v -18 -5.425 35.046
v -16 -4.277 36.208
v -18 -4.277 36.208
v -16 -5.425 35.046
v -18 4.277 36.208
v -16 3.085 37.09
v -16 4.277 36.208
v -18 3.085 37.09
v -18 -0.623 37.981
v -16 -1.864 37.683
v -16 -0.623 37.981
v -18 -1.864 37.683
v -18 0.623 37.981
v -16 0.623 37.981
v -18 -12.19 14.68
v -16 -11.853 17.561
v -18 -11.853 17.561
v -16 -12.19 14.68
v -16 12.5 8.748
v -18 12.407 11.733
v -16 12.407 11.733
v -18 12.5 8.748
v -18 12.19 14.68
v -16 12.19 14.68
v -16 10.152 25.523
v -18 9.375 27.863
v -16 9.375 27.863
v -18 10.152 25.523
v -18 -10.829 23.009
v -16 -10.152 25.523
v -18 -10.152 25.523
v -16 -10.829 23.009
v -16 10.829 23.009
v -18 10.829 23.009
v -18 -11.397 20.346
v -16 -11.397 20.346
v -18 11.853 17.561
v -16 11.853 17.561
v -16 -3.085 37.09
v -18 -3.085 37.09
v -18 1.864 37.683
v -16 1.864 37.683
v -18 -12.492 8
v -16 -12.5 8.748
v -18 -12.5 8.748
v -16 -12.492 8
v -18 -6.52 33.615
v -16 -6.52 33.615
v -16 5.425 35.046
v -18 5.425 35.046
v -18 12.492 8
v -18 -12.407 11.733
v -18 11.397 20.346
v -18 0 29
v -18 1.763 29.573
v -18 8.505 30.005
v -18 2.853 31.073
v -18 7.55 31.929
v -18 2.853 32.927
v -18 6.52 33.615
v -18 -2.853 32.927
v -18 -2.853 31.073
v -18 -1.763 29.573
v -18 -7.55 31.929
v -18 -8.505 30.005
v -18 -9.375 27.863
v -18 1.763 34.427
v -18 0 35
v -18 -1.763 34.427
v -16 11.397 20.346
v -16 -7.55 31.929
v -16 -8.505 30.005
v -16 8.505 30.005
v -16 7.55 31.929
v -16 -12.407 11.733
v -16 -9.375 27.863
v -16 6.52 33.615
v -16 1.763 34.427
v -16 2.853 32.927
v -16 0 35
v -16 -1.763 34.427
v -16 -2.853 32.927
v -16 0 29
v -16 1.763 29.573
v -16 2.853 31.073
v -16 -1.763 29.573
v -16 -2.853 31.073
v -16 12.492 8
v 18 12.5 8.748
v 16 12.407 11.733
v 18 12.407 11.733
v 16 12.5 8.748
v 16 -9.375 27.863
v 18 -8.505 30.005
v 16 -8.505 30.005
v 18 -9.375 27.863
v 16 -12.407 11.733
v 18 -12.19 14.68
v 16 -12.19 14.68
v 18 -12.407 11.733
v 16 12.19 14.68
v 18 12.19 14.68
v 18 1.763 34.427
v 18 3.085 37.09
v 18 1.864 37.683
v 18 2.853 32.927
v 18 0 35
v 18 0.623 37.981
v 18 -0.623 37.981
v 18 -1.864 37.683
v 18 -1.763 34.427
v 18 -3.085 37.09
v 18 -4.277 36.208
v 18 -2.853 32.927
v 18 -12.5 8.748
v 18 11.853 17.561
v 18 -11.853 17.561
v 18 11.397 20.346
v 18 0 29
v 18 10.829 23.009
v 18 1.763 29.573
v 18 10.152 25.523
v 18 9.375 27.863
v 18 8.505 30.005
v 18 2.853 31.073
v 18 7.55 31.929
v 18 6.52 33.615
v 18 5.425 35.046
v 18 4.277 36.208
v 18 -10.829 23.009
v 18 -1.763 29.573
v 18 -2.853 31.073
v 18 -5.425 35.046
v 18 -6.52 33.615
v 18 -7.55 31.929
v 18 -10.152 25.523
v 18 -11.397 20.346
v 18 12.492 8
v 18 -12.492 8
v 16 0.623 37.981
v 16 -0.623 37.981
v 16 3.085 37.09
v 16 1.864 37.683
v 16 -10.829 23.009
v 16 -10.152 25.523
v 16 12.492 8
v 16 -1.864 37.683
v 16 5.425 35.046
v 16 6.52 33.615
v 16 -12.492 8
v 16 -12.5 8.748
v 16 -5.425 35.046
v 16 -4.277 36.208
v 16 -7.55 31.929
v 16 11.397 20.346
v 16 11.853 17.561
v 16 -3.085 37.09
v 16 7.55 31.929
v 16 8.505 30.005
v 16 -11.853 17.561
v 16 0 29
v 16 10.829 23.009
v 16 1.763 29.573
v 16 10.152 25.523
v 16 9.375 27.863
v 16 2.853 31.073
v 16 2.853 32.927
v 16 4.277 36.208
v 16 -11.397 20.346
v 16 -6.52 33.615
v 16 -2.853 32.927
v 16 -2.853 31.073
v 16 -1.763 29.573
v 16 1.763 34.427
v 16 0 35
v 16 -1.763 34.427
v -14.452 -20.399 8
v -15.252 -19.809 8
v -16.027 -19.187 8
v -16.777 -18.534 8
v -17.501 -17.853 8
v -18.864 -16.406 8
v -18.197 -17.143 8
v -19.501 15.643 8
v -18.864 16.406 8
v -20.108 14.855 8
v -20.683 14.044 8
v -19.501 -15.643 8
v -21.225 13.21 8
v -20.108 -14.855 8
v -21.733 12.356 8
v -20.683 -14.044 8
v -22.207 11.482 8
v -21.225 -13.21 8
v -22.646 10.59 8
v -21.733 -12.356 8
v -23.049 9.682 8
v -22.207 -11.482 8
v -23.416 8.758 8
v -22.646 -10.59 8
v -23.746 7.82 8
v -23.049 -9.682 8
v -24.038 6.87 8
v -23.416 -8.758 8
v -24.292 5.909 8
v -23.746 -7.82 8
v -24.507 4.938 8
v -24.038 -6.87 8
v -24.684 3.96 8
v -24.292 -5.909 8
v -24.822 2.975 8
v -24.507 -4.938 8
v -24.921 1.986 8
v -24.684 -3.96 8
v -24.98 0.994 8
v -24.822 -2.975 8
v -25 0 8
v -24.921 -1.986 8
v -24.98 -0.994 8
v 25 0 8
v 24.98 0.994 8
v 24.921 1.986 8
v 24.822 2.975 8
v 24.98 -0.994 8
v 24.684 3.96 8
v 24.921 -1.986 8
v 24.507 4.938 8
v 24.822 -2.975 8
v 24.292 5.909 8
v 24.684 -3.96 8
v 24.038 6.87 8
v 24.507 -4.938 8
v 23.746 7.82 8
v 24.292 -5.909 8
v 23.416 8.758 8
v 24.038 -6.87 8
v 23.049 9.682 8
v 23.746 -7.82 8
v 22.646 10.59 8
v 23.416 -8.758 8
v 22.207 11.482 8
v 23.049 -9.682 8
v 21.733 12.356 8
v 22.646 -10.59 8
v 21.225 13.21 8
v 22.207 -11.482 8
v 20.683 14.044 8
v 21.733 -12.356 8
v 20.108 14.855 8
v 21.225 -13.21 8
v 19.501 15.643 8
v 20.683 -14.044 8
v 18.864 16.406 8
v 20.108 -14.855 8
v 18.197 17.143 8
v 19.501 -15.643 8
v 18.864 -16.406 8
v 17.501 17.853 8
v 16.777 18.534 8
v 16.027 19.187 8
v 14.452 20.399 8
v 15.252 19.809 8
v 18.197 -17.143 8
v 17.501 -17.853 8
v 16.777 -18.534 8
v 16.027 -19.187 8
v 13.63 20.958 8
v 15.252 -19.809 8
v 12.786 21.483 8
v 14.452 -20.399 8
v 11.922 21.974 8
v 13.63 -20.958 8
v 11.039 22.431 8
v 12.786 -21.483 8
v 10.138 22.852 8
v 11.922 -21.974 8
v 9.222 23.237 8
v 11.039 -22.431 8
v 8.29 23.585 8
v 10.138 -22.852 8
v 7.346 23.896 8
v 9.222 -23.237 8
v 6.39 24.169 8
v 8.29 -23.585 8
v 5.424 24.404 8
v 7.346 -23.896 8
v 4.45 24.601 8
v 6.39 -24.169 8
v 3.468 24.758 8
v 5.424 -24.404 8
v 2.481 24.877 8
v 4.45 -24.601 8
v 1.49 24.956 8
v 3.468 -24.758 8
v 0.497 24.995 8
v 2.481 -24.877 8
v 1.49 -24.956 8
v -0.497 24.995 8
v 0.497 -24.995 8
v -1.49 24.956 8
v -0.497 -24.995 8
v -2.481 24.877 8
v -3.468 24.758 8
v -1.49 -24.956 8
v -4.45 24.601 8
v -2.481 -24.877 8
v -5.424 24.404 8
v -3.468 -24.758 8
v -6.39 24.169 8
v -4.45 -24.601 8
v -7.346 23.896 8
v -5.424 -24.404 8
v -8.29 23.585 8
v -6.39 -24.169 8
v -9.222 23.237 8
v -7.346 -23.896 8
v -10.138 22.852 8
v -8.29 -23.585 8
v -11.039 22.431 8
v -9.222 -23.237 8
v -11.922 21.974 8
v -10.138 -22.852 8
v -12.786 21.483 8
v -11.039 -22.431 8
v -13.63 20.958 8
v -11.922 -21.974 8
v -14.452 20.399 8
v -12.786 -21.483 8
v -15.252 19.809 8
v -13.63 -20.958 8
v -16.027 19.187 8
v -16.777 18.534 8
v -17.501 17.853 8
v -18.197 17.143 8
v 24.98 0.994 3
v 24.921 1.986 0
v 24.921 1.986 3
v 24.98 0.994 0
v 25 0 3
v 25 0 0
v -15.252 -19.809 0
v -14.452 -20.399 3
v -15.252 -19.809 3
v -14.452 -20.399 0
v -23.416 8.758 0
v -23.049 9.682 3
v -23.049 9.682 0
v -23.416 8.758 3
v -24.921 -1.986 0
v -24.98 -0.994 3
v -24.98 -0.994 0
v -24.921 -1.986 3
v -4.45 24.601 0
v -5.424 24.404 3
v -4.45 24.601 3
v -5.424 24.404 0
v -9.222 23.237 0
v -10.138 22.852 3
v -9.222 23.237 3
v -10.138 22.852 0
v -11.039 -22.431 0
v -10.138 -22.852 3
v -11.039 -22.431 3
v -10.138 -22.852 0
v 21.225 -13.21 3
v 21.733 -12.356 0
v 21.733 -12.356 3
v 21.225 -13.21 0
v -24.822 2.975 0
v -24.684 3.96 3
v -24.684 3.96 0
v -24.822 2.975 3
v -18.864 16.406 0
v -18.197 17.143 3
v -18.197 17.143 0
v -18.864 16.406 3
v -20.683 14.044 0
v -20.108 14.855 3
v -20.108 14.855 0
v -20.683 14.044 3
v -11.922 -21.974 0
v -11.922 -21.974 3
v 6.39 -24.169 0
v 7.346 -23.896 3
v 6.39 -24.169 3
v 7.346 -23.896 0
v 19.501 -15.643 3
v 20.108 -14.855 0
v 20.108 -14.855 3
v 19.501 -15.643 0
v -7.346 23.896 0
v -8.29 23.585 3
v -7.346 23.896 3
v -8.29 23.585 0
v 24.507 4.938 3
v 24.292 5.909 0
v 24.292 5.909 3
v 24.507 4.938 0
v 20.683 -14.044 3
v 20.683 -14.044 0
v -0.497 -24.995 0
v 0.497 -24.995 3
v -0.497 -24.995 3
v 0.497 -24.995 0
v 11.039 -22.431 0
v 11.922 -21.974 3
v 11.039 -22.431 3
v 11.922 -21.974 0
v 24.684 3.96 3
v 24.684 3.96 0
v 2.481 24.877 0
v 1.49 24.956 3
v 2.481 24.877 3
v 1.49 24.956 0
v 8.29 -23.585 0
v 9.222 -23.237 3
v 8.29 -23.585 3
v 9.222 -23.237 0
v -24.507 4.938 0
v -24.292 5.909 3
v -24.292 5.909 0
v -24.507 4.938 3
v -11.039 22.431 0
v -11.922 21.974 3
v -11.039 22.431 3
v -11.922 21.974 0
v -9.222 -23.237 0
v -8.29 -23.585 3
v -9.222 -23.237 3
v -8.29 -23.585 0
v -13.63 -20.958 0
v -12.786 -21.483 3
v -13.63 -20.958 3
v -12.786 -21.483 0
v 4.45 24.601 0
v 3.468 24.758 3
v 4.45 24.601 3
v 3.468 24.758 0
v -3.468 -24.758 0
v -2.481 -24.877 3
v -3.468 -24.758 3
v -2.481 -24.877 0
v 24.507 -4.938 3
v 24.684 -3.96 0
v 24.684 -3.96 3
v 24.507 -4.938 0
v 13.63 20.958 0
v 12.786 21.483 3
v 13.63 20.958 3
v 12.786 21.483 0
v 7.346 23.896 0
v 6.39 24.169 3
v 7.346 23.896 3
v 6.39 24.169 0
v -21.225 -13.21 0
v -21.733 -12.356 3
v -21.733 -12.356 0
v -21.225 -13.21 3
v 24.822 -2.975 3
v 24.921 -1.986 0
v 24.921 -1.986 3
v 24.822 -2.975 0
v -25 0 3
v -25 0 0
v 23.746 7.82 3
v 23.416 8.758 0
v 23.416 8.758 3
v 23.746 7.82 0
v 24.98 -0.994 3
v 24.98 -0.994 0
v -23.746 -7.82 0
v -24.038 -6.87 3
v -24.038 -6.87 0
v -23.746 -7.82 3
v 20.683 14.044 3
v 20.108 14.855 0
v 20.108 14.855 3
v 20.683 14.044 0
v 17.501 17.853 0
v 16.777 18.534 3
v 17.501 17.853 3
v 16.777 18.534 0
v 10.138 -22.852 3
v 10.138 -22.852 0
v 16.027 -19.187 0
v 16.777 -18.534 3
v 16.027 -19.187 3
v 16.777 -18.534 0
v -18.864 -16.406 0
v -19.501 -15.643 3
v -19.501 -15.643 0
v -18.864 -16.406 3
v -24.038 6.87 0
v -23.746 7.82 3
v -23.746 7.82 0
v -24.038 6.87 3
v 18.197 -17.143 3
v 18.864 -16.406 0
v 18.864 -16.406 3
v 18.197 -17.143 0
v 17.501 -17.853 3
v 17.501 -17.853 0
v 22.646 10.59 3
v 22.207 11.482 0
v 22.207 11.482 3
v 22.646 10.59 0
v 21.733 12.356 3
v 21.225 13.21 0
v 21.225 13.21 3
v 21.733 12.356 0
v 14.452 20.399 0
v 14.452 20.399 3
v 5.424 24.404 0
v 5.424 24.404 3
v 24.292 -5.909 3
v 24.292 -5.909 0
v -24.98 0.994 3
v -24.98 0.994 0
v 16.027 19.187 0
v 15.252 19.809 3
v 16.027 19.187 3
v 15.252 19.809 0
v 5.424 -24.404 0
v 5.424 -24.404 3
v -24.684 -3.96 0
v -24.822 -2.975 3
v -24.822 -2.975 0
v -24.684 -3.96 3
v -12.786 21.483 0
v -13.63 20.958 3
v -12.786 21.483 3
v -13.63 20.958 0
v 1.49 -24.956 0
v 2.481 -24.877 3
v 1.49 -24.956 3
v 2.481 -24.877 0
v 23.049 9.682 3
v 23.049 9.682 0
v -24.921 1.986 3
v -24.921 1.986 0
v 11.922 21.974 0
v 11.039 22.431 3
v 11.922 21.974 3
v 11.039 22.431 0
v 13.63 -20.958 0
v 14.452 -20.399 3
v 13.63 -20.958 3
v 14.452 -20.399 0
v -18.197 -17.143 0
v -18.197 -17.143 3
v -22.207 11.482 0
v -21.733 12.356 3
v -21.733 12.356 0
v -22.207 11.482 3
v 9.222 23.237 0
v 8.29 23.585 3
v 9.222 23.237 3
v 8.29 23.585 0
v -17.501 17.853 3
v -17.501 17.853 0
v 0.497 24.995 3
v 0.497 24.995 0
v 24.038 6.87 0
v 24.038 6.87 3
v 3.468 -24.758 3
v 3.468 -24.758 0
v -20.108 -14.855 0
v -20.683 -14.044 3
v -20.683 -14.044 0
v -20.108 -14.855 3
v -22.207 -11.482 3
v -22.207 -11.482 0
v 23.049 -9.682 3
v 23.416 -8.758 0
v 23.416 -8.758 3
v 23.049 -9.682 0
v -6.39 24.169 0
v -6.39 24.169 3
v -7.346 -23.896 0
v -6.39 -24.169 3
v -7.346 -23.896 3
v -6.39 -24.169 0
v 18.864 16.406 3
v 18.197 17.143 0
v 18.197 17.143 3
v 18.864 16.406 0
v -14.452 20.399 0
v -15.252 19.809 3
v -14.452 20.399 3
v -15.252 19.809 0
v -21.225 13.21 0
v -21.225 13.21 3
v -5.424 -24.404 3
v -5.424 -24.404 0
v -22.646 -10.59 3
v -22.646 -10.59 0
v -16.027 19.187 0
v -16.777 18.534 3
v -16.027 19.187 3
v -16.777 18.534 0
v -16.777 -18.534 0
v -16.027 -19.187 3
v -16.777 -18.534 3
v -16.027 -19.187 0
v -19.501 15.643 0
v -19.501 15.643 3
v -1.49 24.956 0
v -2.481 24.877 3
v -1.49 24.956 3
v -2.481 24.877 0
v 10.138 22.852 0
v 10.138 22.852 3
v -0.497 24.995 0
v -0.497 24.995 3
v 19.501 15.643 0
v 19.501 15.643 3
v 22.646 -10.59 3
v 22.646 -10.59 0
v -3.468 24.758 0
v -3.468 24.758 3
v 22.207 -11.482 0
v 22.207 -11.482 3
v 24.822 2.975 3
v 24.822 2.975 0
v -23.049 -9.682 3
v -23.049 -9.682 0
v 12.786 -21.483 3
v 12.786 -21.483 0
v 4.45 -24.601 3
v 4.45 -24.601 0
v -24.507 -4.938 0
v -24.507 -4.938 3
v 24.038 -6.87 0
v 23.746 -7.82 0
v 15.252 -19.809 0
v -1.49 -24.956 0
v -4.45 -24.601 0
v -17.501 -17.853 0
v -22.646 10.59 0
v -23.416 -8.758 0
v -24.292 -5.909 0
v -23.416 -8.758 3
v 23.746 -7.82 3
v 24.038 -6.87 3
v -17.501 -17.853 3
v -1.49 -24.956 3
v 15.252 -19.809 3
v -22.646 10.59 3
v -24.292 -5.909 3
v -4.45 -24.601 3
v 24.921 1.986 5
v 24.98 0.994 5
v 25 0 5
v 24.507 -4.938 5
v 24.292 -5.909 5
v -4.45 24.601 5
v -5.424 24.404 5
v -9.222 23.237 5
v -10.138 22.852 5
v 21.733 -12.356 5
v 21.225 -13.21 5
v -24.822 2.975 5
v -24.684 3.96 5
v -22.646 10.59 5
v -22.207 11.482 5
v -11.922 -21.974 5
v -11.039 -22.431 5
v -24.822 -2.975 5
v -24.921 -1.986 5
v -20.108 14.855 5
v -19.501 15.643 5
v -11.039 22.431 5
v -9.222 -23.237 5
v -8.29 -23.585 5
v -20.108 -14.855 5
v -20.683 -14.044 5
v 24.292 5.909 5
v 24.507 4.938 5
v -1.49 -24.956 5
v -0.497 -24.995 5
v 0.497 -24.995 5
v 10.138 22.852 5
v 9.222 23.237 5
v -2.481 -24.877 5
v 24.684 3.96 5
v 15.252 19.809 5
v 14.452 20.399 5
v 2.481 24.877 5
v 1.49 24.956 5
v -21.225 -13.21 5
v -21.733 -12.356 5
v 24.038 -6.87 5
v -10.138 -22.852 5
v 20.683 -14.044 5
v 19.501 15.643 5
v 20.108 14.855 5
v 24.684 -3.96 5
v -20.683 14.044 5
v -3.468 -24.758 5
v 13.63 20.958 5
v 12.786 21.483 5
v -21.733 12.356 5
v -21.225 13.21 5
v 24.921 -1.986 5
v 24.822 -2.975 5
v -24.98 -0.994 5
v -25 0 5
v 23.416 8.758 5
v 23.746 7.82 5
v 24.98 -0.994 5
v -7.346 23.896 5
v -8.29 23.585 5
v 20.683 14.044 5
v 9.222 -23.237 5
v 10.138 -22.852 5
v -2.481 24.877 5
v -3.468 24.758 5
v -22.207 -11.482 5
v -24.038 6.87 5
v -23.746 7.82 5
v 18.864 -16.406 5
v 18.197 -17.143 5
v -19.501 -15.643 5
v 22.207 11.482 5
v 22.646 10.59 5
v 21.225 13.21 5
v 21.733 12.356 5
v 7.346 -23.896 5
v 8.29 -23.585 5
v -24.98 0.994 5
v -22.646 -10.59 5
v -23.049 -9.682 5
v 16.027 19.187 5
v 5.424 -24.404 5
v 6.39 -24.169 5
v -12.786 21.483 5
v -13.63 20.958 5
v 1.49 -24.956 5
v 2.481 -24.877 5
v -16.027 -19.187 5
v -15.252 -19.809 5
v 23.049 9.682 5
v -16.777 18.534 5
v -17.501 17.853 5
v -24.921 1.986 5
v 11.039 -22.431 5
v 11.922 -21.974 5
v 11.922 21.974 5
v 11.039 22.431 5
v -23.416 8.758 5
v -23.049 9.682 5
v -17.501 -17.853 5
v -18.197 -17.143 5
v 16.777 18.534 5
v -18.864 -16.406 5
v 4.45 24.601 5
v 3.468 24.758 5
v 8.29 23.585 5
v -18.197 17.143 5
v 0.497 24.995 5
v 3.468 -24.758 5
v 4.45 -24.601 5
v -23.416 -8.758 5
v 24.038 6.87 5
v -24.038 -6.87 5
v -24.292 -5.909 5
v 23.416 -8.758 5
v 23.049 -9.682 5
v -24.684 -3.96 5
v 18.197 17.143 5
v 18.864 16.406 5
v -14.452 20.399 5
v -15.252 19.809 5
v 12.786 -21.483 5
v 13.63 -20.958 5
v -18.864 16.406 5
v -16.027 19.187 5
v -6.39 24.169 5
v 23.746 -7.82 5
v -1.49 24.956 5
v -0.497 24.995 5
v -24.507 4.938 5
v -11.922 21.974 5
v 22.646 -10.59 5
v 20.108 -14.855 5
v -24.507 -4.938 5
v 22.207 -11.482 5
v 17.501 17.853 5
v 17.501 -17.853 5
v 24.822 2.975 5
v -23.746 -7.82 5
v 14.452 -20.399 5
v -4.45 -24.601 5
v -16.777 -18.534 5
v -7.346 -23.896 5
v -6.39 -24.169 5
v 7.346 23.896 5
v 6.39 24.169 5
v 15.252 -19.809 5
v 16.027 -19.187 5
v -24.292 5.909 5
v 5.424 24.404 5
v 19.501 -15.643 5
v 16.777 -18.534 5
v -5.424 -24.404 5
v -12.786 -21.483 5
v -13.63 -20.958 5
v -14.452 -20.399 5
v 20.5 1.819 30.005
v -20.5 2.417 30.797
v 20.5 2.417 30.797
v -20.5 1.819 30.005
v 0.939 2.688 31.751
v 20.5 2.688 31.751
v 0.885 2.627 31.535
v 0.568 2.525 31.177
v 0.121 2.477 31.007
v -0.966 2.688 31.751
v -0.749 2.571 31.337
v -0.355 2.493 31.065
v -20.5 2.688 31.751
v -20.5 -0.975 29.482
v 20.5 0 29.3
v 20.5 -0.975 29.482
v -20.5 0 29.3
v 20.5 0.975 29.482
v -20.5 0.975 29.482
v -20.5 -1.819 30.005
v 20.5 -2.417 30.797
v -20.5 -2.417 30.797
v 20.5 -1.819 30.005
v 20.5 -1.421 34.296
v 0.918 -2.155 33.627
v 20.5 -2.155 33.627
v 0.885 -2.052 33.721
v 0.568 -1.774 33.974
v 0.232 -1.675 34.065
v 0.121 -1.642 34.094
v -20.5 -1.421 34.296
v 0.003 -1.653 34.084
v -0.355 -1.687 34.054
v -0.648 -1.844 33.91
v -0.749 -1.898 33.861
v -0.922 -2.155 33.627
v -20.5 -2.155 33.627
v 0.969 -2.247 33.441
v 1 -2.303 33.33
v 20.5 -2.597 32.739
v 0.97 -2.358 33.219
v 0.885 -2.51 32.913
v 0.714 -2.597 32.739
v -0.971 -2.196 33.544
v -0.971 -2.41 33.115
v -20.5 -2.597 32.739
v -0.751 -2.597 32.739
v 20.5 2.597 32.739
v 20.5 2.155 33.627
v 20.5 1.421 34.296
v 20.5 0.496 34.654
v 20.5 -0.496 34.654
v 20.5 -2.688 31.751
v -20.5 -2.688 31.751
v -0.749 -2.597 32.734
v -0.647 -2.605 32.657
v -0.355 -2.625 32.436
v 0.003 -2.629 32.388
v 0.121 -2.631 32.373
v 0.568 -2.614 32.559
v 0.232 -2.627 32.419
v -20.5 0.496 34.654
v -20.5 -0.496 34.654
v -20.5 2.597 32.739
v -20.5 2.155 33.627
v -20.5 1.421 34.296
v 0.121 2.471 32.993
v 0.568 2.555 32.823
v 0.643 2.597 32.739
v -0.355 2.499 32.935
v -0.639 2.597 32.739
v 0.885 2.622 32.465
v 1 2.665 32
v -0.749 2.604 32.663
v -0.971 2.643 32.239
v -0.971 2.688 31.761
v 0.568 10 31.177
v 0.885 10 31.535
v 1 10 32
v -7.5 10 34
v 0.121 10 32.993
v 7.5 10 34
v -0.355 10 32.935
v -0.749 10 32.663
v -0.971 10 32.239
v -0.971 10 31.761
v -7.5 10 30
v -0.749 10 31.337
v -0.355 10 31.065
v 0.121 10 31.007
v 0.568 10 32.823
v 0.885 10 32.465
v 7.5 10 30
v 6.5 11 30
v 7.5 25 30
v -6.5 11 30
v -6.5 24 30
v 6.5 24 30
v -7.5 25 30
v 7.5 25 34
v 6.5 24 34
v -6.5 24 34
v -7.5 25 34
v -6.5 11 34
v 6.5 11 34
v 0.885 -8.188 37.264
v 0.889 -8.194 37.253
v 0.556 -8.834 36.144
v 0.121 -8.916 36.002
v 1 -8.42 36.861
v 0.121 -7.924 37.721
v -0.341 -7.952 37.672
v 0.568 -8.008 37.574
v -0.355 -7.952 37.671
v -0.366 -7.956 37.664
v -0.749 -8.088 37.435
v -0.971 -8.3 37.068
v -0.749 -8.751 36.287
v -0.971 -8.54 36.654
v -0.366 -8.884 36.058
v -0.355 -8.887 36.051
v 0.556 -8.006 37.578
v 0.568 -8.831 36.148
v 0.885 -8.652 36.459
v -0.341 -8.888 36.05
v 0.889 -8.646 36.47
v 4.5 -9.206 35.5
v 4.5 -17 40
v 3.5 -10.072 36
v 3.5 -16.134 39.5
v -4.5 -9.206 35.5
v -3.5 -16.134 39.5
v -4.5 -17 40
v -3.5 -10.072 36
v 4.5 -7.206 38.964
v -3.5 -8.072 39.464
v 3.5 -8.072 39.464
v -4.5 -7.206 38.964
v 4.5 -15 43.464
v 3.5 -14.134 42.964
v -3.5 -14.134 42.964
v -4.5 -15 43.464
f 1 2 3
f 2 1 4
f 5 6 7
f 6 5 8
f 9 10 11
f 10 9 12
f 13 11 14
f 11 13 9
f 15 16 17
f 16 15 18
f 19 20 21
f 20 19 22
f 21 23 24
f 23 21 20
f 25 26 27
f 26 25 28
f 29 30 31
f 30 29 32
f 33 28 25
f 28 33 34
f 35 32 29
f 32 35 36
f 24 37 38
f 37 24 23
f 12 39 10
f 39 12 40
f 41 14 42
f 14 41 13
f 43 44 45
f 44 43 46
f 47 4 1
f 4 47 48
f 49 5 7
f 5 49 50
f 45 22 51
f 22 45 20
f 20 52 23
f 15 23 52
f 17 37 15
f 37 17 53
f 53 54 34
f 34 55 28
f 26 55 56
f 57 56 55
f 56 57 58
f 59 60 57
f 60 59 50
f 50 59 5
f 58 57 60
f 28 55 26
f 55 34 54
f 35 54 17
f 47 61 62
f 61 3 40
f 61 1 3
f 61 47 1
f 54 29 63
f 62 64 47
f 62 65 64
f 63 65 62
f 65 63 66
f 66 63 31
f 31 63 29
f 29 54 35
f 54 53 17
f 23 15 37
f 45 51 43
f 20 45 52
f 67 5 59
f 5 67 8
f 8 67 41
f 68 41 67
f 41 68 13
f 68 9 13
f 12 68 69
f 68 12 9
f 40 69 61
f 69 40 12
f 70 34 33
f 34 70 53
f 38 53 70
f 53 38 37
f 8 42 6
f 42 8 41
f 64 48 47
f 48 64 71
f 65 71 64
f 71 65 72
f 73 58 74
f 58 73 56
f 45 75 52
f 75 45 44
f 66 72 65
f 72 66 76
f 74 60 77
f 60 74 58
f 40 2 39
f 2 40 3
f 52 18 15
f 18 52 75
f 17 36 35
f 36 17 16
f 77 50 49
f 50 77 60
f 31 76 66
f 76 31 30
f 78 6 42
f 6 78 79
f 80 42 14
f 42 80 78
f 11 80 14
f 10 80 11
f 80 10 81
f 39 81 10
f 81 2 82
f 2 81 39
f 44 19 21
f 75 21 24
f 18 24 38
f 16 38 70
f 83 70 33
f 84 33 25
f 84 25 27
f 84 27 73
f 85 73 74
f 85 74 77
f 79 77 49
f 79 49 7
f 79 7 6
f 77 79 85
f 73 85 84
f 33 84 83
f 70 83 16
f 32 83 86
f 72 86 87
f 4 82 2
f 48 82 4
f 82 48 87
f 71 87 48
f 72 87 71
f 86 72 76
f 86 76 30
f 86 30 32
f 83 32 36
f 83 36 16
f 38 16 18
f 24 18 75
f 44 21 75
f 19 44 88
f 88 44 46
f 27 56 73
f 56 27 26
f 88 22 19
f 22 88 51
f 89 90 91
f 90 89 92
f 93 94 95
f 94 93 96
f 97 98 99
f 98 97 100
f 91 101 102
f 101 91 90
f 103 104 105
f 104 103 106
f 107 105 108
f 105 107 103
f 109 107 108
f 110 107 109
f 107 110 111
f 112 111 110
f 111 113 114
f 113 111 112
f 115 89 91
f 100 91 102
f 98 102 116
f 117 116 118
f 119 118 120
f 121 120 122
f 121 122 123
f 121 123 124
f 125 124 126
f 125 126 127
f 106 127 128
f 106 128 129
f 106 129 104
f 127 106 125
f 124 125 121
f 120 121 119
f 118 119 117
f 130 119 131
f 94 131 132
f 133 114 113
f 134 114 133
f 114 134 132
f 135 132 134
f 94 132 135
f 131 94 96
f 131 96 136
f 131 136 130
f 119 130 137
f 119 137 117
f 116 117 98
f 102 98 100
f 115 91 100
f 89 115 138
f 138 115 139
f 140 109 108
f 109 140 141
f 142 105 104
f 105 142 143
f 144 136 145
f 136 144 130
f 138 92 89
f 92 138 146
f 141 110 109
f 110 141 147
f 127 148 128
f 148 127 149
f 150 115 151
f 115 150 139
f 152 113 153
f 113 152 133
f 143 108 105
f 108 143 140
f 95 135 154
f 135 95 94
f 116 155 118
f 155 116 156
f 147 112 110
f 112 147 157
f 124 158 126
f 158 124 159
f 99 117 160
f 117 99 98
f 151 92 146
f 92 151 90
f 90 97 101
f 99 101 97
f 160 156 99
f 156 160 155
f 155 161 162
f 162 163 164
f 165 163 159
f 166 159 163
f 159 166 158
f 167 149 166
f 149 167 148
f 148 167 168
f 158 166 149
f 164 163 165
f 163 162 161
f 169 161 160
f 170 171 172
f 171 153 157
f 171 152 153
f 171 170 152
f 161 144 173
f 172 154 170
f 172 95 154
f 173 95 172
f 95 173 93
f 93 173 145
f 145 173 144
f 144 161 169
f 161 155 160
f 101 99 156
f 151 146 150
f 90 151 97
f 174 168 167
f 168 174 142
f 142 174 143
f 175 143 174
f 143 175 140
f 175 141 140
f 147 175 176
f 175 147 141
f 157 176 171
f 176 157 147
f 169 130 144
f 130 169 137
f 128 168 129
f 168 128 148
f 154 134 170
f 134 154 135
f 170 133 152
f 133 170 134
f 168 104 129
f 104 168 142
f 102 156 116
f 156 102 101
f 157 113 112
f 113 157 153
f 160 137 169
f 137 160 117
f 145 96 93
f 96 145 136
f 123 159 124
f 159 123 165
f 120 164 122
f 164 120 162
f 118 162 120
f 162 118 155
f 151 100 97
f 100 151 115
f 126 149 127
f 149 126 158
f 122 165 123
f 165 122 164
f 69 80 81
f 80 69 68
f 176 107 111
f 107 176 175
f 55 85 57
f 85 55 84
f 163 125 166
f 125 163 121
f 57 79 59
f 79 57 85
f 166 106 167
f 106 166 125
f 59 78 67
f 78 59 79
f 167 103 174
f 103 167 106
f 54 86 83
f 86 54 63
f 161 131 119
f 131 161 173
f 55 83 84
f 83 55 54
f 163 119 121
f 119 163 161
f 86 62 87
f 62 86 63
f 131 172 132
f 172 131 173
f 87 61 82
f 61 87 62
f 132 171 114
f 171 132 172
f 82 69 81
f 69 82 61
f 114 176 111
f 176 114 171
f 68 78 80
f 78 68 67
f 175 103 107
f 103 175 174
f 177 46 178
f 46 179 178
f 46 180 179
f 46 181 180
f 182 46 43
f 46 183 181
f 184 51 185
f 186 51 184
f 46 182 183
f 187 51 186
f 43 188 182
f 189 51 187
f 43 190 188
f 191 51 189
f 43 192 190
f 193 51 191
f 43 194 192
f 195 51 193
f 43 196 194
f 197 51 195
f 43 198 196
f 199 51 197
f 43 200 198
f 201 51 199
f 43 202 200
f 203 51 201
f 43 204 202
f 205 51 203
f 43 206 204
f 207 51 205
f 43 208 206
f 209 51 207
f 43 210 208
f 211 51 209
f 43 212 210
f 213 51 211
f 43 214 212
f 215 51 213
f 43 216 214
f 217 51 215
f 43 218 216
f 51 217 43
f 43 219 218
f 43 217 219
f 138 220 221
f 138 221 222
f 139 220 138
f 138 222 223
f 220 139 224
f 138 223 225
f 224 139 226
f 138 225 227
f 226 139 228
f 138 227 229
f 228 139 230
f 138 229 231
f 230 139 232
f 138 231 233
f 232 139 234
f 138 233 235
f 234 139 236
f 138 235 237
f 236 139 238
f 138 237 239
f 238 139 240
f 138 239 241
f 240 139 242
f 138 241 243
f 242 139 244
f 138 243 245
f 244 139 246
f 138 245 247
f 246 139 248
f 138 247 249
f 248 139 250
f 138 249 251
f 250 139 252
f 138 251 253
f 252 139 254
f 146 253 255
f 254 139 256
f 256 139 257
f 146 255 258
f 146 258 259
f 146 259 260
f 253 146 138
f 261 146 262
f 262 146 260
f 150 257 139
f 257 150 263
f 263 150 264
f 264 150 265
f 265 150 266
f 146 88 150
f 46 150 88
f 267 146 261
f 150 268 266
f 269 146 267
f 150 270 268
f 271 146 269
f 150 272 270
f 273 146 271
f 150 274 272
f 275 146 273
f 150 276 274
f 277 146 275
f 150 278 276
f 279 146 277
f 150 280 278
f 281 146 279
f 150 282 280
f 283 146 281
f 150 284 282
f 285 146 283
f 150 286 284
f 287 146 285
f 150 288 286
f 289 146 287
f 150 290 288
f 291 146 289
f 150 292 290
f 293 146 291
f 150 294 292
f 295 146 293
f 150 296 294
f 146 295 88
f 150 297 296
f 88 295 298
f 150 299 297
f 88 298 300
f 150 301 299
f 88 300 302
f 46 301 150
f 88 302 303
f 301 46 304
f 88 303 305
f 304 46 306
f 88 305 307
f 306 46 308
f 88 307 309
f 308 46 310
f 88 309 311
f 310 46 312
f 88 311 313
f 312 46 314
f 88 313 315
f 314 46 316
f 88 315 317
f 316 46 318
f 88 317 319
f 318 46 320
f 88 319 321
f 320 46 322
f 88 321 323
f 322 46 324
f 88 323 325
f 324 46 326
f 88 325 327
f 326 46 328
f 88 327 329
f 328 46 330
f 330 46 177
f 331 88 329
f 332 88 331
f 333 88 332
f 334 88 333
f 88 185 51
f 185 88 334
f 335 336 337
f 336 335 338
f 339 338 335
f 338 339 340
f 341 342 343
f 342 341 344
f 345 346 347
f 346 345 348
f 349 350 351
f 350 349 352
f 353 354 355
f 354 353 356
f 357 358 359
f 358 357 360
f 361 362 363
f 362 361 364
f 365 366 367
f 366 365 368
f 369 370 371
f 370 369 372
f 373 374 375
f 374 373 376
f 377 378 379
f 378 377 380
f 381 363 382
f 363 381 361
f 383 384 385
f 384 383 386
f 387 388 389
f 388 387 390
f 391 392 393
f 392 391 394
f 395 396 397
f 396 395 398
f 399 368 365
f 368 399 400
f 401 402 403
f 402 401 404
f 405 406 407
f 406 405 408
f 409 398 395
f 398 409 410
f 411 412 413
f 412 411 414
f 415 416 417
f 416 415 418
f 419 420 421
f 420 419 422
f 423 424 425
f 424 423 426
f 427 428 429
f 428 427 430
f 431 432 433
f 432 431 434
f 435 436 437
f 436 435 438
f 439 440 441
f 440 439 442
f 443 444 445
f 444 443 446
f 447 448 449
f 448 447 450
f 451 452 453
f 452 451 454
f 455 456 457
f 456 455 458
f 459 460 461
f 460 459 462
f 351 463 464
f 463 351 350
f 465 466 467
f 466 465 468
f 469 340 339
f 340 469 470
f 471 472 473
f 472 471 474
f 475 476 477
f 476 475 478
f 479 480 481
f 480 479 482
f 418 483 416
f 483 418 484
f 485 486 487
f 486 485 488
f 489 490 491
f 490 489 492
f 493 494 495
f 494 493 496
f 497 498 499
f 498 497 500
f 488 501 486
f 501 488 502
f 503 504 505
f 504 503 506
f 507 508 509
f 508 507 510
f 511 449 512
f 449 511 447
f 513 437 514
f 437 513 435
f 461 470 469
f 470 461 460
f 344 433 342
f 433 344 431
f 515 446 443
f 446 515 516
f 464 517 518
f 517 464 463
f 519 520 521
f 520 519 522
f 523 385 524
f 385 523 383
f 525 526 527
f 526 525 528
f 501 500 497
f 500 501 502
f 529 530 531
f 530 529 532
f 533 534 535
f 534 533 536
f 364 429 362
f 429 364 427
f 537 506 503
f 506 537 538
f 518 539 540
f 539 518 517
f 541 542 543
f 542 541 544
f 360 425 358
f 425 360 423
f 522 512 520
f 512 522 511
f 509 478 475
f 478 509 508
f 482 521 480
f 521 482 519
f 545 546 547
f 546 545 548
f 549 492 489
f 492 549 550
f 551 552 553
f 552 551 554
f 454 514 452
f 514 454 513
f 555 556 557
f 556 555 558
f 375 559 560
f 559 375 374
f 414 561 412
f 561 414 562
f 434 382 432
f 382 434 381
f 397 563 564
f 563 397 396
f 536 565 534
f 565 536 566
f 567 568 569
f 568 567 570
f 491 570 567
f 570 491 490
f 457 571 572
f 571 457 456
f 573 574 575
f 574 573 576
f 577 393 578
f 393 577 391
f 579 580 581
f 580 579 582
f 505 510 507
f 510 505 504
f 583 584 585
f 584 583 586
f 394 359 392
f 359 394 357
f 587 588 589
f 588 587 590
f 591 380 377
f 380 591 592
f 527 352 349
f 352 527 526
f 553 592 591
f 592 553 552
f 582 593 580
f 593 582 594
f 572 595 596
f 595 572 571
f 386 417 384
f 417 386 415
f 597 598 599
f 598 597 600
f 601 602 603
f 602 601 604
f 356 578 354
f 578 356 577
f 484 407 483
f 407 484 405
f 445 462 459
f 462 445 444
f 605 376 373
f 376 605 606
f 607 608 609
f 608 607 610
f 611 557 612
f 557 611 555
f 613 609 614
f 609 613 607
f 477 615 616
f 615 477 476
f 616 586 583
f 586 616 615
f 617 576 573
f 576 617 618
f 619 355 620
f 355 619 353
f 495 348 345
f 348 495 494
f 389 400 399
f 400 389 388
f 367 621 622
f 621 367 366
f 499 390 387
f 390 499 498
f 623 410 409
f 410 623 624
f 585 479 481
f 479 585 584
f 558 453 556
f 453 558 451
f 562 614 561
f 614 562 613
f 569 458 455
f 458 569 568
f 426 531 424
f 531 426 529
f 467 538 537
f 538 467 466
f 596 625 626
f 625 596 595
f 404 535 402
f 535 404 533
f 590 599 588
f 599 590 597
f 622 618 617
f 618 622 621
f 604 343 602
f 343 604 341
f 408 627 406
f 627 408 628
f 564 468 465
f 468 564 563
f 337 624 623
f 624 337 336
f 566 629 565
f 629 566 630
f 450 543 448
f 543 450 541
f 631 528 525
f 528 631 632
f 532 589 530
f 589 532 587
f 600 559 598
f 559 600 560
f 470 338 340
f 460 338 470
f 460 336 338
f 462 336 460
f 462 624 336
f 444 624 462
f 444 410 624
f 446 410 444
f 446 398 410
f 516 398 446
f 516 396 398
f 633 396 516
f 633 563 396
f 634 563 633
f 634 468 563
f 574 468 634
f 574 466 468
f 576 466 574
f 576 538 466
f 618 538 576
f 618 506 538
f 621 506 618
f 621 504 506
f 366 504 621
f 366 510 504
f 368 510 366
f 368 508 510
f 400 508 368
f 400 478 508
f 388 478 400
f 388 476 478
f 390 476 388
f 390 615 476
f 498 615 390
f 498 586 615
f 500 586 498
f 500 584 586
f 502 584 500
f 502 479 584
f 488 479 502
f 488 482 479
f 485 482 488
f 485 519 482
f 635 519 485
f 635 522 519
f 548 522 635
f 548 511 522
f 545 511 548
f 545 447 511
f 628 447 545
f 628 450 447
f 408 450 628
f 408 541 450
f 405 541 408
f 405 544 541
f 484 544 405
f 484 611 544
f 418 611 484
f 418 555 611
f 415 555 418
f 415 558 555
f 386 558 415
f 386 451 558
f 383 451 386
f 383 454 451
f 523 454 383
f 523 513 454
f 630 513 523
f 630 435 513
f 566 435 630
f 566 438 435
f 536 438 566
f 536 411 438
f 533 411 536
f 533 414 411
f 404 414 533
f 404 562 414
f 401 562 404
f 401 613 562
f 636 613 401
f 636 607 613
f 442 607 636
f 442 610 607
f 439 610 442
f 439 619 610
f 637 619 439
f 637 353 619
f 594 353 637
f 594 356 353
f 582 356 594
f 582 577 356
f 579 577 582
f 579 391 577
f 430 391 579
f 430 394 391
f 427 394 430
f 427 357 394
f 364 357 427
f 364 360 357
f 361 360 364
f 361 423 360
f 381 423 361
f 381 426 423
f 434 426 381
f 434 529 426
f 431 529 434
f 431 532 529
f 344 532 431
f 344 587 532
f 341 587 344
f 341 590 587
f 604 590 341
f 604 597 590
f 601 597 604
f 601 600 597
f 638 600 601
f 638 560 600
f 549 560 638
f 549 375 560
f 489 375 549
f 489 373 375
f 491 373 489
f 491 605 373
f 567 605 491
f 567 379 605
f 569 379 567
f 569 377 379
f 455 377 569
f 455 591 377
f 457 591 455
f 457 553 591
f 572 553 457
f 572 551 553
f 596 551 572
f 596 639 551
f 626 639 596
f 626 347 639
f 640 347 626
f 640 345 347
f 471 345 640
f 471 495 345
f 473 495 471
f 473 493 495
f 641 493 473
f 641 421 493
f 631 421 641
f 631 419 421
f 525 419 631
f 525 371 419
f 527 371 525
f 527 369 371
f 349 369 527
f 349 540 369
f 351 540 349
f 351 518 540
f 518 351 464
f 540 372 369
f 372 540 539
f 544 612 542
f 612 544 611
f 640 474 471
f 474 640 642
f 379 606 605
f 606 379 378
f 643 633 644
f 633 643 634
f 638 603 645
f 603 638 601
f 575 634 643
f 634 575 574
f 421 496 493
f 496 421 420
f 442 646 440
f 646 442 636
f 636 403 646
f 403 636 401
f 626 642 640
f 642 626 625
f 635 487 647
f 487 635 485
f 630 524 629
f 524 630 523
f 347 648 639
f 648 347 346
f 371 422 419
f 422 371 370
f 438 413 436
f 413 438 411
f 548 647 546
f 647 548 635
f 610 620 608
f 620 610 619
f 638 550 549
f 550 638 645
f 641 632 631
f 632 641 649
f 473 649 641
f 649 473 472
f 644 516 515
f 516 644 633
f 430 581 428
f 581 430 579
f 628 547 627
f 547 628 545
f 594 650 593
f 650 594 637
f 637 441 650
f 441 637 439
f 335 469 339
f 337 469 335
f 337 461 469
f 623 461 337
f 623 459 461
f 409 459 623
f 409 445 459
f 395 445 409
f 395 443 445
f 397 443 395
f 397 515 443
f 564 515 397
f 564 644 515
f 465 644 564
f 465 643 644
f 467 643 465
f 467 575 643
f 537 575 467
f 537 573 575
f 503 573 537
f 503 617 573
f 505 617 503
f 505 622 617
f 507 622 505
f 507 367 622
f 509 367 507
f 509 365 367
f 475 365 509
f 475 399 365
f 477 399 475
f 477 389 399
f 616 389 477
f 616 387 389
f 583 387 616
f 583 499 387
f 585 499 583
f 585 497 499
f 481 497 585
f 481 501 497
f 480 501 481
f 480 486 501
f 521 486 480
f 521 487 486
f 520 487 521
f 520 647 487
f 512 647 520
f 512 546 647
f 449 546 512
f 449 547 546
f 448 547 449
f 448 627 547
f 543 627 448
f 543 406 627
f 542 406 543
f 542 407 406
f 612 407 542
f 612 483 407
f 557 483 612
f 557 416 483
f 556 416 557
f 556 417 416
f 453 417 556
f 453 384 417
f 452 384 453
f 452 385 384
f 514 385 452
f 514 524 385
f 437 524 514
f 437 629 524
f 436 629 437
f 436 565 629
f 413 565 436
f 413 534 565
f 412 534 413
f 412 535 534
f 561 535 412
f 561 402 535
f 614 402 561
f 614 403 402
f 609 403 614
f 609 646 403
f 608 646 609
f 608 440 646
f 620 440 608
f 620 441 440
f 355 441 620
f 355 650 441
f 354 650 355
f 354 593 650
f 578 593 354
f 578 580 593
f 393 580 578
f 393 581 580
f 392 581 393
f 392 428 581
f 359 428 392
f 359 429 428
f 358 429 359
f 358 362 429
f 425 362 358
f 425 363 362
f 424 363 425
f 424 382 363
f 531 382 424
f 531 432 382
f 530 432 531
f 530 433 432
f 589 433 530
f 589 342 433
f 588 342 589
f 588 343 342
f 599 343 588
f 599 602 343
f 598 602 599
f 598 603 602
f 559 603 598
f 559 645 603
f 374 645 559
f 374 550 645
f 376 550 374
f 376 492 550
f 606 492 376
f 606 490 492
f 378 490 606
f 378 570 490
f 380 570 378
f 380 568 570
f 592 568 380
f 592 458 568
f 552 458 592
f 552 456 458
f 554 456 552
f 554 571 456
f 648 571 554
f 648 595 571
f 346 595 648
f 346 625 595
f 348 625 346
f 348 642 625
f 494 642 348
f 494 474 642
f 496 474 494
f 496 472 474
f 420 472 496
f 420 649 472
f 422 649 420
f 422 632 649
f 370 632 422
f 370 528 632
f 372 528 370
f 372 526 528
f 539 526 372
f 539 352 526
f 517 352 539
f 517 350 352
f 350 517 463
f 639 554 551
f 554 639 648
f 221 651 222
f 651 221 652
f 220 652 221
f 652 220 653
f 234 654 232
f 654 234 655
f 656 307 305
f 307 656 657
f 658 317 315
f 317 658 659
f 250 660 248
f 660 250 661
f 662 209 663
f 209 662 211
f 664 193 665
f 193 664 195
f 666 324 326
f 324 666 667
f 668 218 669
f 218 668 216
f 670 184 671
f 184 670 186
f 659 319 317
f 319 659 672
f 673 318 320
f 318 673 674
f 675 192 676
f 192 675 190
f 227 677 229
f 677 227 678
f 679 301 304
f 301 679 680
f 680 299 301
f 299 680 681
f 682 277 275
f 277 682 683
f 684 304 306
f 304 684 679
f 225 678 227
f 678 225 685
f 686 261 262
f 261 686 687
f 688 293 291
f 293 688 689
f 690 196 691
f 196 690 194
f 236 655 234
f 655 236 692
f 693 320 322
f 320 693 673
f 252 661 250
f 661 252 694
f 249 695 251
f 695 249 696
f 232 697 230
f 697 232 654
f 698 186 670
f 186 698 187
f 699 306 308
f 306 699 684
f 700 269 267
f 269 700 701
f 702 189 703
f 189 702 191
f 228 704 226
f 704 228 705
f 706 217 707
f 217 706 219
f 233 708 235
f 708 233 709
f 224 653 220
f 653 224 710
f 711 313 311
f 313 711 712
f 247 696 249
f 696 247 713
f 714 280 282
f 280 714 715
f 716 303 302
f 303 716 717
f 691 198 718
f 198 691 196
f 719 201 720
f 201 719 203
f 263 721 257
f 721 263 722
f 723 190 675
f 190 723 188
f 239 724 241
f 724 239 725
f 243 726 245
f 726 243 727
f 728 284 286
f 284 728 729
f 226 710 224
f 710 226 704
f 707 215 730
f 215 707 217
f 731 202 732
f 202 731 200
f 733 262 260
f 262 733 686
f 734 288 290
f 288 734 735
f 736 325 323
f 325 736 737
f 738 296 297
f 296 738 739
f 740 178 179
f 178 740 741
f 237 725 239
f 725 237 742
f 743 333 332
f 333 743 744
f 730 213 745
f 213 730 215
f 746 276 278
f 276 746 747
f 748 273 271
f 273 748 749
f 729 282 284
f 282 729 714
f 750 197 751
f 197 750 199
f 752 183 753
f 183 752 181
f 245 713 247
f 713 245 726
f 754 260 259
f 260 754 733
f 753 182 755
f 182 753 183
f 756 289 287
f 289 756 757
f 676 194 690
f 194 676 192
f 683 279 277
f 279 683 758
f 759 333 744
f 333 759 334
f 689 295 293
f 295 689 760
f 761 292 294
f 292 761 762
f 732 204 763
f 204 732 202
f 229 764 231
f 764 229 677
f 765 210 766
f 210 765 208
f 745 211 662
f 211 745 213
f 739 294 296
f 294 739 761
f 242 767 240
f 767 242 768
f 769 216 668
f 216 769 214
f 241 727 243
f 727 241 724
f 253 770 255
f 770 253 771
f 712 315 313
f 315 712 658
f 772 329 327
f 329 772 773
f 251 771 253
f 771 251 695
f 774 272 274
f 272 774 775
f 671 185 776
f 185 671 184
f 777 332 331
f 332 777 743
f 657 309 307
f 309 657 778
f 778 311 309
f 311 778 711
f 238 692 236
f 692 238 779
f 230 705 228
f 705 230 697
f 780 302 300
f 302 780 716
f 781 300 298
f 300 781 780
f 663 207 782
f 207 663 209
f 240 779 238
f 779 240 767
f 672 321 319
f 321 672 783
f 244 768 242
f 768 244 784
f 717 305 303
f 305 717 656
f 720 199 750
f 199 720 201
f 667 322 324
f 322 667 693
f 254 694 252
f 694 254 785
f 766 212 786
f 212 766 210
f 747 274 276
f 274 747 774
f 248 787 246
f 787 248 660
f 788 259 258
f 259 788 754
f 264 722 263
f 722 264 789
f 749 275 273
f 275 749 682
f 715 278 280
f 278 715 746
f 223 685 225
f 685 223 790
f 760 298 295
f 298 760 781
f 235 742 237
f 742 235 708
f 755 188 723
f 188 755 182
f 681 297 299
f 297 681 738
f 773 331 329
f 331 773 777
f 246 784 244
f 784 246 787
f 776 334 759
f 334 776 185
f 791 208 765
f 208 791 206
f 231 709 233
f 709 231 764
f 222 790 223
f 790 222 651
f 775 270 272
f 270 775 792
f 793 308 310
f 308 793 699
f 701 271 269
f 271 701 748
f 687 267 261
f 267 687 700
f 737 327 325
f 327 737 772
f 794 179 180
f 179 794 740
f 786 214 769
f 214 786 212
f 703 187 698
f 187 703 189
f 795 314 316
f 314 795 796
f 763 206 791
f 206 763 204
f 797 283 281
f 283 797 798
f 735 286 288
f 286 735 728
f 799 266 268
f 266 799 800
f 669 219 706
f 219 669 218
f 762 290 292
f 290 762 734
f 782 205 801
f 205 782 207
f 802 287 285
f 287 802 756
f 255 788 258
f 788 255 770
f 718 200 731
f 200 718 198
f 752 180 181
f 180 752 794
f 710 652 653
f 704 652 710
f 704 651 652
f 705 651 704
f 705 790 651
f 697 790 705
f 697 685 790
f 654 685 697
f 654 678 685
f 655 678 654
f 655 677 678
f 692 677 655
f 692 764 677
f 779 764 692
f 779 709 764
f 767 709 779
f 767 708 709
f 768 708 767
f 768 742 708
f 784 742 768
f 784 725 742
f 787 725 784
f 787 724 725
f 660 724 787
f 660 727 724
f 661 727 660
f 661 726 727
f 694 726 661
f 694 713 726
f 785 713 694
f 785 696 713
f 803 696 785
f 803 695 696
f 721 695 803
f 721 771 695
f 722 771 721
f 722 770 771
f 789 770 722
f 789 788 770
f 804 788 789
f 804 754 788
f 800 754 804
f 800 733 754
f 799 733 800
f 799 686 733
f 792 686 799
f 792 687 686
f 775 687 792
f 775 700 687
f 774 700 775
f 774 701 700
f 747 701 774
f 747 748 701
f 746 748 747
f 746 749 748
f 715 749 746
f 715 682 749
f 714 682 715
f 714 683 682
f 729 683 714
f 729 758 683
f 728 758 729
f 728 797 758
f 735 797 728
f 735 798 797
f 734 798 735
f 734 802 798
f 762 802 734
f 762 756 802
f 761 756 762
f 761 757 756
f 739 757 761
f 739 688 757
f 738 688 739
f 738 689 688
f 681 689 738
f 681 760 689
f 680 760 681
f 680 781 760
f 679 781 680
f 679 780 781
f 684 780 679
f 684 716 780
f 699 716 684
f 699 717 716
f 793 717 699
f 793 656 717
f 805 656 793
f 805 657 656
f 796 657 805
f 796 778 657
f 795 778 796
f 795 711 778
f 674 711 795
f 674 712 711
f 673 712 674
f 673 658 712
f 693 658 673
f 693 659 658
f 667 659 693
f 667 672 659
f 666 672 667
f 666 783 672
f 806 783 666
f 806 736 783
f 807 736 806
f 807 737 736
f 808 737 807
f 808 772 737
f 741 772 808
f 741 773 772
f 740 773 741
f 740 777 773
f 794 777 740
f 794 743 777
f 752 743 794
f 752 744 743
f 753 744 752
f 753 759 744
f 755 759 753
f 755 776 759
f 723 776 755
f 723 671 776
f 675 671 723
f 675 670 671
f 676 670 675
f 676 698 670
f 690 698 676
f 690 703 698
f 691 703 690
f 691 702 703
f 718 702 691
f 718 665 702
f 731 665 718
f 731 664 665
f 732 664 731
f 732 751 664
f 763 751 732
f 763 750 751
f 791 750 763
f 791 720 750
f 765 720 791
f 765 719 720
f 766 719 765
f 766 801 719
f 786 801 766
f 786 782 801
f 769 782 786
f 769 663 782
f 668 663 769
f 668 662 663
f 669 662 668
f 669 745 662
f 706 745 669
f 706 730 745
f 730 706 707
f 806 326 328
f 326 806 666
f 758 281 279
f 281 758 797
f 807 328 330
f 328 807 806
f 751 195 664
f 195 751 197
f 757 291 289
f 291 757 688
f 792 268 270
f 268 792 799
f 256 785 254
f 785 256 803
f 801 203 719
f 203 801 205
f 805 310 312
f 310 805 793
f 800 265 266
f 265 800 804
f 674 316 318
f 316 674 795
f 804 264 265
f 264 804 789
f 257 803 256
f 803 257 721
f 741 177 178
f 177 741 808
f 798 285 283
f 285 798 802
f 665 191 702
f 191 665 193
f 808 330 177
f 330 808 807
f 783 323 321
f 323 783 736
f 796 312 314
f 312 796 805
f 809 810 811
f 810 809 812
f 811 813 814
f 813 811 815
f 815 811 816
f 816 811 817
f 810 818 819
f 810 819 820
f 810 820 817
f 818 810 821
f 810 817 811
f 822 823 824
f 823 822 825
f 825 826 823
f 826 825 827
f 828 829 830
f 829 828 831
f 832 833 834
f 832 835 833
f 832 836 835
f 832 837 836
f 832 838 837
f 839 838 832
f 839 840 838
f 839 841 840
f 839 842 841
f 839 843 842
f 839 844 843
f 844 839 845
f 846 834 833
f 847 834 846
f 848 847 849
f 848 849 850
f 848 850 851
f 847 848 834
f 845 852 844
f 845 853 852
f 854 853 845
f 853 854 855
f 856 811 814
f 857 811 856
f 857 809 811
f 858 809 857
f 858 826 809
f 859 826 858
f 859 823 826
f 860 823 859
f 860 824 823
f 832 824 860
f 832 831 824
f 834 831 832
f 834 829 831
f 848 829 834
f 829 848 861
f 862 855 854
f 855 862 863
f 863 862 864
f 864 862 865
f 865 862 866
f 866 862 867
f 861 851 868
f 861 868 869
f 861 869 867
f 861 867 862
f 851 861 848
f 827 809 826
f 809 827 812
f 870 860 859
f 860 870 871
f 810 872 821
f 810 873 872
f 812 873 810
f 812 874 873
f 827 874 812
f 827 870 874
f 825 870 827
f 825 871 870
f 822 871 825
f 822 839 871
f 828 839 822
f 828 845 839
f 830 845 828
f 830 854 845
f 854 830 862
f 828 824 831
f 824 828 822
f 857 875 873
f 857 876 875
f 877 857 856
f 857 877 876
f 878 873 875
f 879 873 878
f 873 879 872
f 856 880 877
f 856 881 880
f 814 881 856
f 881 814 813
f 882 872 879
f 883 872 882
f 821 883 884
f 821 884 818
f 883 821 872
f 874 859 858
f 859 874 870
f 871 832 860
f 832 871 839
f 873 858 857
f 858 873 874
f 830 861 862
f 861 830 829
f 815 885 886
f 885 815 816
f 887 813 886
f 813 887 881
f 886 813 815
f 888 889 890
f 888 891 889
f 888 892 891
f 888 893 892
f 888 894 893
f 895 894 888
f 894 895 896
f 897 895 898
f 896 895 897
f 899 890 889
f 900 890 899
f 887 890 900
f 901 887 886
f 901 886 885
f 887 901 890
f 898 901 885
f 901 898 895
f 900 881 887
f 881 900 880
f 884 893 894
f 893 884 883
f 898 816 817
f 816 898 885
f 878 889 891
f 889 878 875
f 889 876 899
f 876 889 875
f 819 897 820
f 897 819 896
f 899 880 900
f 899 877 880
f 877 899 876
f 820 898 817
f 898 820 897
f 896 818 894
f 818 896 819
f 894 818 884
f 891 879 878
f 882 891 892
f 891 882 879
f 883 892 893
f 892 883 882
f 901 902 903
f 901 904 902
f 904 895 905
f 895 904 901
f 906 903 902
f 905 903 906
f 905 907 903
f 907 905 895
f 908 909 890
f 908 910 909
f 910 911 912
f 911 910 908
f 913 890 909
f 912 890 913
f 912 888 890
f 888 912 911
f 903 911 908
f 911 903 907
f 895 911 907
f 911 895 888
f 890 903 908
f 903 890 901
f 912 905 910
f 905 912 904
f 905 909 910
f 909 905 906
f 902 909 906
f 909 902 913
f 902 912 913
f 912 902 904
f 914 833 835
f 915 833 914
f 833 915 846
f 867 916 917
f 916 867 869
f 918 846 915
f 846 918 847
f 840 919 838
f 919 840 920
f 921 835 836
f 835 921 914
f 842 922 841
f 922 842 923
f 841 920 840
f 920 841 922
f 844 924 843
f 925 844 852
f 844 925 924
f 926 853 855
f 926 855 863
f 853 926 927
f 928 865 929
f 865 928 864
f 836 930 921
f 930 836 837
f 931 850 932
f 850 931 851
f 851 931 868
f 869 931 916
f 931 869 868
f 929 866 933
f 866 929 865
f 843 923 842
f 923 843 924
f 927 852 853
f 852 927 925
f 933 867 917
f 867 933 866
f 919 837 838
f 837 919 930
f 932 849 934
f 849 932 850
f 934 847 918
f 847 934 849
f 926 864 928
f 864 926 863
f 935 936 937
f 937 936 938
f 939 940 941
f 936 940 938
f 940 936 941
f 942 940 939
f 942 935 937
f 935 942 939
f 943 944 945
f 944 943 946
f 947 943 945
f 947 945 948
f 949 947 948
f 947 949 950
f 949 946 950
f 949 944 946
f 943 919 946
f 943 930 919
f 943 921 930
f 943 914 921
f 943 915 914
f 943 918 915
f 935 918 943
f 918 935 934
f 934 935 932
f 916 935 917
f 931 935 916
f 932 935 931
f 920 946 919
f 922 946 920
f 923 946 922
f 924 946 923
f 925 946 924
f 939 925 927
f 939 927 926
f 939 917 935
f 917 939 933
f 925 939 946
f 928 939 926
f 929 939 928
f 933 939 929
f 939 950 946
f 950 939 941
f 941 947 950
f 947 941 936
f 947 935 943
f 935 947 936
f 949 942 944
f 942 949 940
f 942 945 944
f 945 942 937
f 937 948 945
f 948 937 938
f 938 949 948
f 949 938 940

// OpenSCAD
// ~~~~~~ PARAMS ~~~~~~

base_diam = 25;
base_height = 3;
base_gap = 2;
upright_height = 30;
upright_length = 25;
upright_width = 2;
upright_to_centre = 18;
upright_to_upright = 2*upright_to_centre;
hole_diam = 3;
hole_space = 0.3;
base_to_hole = 24;
main_rod_extention = 5;
//distance rod extends from uprights


// ~~~~~~ BASE ~~~~~~

color(c="silver")
cylinder(base_height,base_diam,base_diam,$fa=1,$fs=1);

color(c="silver")
translate([0,0,base_gap+base_height])
cylinder(base_height,base_diam,base_diam,$fa=1,$fs=1);


// ~~~~~~ UPRIGHTS ~~~~~~

color(c="silver")
difference() {
    
    difference() {

        union() {
        
            translate([-upright_to_centre,0,2*base_height+base_gap])
            rotate([0,90,0])
            linear_extrude(upright_width)
            resize([upright_height*2, upright_length])circle(d=20,$fa=1,$fs=1);
            
            translate([upright_to_centre-upright_width,0,2*base_height+base_gap])
            rotate([0,90,0])
            linear_extrude(upright_width)
            resize([upright_height*2, upright_length])circle(d=20,$fa=1,$fs=1);
        }
        
        // ~~~~~~ UPRIGHT HOLES ~~~~~~
        
        translate([0,0,base_to_hole+2*base_height+base_gap])
        rotate([0,90,0])
        cylinder(2*base_diam,hole_diam,hole_diam,center=true);
        
    }
    
    // ~~~~~~ REMOVE LOWER UPRIGHT ~~~~~~
    
    translate([0,0,2*base_height+base_gap])
    rotate([180,0,0])
    cylinder(upright_height+1,base_diam,base_diam);
}


// ~~~~~~ MAIN ROD ~~~~~~

translate([0,0,base_to_hole+2*base_height+base_gap])
rotate([0,90,0])
cylinder(upright_to_upright+main_rod_extention,hole_diam-hole_space,hole_diam-hole_space,center=true,$fa=1,$fs=1);


// ~~~~~~ SIDE ROD (AMMO) ~~~~~~

translate([0,0,base_to_hole+2*base_height+base_gap])
rotate([-90,0,0])
cylinder(10,1,1,$fa=1,$fs=0.5);


// ~~~~~~ BOX HOLDER ~~~~~~

translate([-15/2,10,base_to_hole+2*base_height+base_gap-2])
linear_extrude(height=4)
polygon(points = [[0,0],[0,15],[15,15],[15,0],[1,1],[1,14],[14,14],[14,1]], paths = [[0,1,2,3],[4,5,6,7]]);


// ~~~~~~ SIDE ROD (TRIGGER) ~~~~~~

translate([0,0,base_to_hole+2*base_height+base_gap])
rotate([60,0,0])
cylinder(10,1,1,$fa=1,$fs=0.5);


// ~~~~~~ TRIGGER HOLDER ~~~~~~

out = 9;

translate([-out/2,-17,base_to_hole+2*base_height+base_gap+8])
rotate([-30,0,0])
linear_extrude(height=4)
polygon(points = [[0,0],[0,out],[out,out],[out,0],[1,1],[1,out-1],[out-1,out-1],[out-1,1]], paths = [[0,1,2,3],[4,5,6,7]]);


// ~~~~~~ RULER ~~~~~~

//rotate( [90, 0, 0] ) import("C:/Users/Lewis/Downloads/OpenSCAD_Ruler/OpenSCAD_Ruler/ruler.stl", convexity = 5);
